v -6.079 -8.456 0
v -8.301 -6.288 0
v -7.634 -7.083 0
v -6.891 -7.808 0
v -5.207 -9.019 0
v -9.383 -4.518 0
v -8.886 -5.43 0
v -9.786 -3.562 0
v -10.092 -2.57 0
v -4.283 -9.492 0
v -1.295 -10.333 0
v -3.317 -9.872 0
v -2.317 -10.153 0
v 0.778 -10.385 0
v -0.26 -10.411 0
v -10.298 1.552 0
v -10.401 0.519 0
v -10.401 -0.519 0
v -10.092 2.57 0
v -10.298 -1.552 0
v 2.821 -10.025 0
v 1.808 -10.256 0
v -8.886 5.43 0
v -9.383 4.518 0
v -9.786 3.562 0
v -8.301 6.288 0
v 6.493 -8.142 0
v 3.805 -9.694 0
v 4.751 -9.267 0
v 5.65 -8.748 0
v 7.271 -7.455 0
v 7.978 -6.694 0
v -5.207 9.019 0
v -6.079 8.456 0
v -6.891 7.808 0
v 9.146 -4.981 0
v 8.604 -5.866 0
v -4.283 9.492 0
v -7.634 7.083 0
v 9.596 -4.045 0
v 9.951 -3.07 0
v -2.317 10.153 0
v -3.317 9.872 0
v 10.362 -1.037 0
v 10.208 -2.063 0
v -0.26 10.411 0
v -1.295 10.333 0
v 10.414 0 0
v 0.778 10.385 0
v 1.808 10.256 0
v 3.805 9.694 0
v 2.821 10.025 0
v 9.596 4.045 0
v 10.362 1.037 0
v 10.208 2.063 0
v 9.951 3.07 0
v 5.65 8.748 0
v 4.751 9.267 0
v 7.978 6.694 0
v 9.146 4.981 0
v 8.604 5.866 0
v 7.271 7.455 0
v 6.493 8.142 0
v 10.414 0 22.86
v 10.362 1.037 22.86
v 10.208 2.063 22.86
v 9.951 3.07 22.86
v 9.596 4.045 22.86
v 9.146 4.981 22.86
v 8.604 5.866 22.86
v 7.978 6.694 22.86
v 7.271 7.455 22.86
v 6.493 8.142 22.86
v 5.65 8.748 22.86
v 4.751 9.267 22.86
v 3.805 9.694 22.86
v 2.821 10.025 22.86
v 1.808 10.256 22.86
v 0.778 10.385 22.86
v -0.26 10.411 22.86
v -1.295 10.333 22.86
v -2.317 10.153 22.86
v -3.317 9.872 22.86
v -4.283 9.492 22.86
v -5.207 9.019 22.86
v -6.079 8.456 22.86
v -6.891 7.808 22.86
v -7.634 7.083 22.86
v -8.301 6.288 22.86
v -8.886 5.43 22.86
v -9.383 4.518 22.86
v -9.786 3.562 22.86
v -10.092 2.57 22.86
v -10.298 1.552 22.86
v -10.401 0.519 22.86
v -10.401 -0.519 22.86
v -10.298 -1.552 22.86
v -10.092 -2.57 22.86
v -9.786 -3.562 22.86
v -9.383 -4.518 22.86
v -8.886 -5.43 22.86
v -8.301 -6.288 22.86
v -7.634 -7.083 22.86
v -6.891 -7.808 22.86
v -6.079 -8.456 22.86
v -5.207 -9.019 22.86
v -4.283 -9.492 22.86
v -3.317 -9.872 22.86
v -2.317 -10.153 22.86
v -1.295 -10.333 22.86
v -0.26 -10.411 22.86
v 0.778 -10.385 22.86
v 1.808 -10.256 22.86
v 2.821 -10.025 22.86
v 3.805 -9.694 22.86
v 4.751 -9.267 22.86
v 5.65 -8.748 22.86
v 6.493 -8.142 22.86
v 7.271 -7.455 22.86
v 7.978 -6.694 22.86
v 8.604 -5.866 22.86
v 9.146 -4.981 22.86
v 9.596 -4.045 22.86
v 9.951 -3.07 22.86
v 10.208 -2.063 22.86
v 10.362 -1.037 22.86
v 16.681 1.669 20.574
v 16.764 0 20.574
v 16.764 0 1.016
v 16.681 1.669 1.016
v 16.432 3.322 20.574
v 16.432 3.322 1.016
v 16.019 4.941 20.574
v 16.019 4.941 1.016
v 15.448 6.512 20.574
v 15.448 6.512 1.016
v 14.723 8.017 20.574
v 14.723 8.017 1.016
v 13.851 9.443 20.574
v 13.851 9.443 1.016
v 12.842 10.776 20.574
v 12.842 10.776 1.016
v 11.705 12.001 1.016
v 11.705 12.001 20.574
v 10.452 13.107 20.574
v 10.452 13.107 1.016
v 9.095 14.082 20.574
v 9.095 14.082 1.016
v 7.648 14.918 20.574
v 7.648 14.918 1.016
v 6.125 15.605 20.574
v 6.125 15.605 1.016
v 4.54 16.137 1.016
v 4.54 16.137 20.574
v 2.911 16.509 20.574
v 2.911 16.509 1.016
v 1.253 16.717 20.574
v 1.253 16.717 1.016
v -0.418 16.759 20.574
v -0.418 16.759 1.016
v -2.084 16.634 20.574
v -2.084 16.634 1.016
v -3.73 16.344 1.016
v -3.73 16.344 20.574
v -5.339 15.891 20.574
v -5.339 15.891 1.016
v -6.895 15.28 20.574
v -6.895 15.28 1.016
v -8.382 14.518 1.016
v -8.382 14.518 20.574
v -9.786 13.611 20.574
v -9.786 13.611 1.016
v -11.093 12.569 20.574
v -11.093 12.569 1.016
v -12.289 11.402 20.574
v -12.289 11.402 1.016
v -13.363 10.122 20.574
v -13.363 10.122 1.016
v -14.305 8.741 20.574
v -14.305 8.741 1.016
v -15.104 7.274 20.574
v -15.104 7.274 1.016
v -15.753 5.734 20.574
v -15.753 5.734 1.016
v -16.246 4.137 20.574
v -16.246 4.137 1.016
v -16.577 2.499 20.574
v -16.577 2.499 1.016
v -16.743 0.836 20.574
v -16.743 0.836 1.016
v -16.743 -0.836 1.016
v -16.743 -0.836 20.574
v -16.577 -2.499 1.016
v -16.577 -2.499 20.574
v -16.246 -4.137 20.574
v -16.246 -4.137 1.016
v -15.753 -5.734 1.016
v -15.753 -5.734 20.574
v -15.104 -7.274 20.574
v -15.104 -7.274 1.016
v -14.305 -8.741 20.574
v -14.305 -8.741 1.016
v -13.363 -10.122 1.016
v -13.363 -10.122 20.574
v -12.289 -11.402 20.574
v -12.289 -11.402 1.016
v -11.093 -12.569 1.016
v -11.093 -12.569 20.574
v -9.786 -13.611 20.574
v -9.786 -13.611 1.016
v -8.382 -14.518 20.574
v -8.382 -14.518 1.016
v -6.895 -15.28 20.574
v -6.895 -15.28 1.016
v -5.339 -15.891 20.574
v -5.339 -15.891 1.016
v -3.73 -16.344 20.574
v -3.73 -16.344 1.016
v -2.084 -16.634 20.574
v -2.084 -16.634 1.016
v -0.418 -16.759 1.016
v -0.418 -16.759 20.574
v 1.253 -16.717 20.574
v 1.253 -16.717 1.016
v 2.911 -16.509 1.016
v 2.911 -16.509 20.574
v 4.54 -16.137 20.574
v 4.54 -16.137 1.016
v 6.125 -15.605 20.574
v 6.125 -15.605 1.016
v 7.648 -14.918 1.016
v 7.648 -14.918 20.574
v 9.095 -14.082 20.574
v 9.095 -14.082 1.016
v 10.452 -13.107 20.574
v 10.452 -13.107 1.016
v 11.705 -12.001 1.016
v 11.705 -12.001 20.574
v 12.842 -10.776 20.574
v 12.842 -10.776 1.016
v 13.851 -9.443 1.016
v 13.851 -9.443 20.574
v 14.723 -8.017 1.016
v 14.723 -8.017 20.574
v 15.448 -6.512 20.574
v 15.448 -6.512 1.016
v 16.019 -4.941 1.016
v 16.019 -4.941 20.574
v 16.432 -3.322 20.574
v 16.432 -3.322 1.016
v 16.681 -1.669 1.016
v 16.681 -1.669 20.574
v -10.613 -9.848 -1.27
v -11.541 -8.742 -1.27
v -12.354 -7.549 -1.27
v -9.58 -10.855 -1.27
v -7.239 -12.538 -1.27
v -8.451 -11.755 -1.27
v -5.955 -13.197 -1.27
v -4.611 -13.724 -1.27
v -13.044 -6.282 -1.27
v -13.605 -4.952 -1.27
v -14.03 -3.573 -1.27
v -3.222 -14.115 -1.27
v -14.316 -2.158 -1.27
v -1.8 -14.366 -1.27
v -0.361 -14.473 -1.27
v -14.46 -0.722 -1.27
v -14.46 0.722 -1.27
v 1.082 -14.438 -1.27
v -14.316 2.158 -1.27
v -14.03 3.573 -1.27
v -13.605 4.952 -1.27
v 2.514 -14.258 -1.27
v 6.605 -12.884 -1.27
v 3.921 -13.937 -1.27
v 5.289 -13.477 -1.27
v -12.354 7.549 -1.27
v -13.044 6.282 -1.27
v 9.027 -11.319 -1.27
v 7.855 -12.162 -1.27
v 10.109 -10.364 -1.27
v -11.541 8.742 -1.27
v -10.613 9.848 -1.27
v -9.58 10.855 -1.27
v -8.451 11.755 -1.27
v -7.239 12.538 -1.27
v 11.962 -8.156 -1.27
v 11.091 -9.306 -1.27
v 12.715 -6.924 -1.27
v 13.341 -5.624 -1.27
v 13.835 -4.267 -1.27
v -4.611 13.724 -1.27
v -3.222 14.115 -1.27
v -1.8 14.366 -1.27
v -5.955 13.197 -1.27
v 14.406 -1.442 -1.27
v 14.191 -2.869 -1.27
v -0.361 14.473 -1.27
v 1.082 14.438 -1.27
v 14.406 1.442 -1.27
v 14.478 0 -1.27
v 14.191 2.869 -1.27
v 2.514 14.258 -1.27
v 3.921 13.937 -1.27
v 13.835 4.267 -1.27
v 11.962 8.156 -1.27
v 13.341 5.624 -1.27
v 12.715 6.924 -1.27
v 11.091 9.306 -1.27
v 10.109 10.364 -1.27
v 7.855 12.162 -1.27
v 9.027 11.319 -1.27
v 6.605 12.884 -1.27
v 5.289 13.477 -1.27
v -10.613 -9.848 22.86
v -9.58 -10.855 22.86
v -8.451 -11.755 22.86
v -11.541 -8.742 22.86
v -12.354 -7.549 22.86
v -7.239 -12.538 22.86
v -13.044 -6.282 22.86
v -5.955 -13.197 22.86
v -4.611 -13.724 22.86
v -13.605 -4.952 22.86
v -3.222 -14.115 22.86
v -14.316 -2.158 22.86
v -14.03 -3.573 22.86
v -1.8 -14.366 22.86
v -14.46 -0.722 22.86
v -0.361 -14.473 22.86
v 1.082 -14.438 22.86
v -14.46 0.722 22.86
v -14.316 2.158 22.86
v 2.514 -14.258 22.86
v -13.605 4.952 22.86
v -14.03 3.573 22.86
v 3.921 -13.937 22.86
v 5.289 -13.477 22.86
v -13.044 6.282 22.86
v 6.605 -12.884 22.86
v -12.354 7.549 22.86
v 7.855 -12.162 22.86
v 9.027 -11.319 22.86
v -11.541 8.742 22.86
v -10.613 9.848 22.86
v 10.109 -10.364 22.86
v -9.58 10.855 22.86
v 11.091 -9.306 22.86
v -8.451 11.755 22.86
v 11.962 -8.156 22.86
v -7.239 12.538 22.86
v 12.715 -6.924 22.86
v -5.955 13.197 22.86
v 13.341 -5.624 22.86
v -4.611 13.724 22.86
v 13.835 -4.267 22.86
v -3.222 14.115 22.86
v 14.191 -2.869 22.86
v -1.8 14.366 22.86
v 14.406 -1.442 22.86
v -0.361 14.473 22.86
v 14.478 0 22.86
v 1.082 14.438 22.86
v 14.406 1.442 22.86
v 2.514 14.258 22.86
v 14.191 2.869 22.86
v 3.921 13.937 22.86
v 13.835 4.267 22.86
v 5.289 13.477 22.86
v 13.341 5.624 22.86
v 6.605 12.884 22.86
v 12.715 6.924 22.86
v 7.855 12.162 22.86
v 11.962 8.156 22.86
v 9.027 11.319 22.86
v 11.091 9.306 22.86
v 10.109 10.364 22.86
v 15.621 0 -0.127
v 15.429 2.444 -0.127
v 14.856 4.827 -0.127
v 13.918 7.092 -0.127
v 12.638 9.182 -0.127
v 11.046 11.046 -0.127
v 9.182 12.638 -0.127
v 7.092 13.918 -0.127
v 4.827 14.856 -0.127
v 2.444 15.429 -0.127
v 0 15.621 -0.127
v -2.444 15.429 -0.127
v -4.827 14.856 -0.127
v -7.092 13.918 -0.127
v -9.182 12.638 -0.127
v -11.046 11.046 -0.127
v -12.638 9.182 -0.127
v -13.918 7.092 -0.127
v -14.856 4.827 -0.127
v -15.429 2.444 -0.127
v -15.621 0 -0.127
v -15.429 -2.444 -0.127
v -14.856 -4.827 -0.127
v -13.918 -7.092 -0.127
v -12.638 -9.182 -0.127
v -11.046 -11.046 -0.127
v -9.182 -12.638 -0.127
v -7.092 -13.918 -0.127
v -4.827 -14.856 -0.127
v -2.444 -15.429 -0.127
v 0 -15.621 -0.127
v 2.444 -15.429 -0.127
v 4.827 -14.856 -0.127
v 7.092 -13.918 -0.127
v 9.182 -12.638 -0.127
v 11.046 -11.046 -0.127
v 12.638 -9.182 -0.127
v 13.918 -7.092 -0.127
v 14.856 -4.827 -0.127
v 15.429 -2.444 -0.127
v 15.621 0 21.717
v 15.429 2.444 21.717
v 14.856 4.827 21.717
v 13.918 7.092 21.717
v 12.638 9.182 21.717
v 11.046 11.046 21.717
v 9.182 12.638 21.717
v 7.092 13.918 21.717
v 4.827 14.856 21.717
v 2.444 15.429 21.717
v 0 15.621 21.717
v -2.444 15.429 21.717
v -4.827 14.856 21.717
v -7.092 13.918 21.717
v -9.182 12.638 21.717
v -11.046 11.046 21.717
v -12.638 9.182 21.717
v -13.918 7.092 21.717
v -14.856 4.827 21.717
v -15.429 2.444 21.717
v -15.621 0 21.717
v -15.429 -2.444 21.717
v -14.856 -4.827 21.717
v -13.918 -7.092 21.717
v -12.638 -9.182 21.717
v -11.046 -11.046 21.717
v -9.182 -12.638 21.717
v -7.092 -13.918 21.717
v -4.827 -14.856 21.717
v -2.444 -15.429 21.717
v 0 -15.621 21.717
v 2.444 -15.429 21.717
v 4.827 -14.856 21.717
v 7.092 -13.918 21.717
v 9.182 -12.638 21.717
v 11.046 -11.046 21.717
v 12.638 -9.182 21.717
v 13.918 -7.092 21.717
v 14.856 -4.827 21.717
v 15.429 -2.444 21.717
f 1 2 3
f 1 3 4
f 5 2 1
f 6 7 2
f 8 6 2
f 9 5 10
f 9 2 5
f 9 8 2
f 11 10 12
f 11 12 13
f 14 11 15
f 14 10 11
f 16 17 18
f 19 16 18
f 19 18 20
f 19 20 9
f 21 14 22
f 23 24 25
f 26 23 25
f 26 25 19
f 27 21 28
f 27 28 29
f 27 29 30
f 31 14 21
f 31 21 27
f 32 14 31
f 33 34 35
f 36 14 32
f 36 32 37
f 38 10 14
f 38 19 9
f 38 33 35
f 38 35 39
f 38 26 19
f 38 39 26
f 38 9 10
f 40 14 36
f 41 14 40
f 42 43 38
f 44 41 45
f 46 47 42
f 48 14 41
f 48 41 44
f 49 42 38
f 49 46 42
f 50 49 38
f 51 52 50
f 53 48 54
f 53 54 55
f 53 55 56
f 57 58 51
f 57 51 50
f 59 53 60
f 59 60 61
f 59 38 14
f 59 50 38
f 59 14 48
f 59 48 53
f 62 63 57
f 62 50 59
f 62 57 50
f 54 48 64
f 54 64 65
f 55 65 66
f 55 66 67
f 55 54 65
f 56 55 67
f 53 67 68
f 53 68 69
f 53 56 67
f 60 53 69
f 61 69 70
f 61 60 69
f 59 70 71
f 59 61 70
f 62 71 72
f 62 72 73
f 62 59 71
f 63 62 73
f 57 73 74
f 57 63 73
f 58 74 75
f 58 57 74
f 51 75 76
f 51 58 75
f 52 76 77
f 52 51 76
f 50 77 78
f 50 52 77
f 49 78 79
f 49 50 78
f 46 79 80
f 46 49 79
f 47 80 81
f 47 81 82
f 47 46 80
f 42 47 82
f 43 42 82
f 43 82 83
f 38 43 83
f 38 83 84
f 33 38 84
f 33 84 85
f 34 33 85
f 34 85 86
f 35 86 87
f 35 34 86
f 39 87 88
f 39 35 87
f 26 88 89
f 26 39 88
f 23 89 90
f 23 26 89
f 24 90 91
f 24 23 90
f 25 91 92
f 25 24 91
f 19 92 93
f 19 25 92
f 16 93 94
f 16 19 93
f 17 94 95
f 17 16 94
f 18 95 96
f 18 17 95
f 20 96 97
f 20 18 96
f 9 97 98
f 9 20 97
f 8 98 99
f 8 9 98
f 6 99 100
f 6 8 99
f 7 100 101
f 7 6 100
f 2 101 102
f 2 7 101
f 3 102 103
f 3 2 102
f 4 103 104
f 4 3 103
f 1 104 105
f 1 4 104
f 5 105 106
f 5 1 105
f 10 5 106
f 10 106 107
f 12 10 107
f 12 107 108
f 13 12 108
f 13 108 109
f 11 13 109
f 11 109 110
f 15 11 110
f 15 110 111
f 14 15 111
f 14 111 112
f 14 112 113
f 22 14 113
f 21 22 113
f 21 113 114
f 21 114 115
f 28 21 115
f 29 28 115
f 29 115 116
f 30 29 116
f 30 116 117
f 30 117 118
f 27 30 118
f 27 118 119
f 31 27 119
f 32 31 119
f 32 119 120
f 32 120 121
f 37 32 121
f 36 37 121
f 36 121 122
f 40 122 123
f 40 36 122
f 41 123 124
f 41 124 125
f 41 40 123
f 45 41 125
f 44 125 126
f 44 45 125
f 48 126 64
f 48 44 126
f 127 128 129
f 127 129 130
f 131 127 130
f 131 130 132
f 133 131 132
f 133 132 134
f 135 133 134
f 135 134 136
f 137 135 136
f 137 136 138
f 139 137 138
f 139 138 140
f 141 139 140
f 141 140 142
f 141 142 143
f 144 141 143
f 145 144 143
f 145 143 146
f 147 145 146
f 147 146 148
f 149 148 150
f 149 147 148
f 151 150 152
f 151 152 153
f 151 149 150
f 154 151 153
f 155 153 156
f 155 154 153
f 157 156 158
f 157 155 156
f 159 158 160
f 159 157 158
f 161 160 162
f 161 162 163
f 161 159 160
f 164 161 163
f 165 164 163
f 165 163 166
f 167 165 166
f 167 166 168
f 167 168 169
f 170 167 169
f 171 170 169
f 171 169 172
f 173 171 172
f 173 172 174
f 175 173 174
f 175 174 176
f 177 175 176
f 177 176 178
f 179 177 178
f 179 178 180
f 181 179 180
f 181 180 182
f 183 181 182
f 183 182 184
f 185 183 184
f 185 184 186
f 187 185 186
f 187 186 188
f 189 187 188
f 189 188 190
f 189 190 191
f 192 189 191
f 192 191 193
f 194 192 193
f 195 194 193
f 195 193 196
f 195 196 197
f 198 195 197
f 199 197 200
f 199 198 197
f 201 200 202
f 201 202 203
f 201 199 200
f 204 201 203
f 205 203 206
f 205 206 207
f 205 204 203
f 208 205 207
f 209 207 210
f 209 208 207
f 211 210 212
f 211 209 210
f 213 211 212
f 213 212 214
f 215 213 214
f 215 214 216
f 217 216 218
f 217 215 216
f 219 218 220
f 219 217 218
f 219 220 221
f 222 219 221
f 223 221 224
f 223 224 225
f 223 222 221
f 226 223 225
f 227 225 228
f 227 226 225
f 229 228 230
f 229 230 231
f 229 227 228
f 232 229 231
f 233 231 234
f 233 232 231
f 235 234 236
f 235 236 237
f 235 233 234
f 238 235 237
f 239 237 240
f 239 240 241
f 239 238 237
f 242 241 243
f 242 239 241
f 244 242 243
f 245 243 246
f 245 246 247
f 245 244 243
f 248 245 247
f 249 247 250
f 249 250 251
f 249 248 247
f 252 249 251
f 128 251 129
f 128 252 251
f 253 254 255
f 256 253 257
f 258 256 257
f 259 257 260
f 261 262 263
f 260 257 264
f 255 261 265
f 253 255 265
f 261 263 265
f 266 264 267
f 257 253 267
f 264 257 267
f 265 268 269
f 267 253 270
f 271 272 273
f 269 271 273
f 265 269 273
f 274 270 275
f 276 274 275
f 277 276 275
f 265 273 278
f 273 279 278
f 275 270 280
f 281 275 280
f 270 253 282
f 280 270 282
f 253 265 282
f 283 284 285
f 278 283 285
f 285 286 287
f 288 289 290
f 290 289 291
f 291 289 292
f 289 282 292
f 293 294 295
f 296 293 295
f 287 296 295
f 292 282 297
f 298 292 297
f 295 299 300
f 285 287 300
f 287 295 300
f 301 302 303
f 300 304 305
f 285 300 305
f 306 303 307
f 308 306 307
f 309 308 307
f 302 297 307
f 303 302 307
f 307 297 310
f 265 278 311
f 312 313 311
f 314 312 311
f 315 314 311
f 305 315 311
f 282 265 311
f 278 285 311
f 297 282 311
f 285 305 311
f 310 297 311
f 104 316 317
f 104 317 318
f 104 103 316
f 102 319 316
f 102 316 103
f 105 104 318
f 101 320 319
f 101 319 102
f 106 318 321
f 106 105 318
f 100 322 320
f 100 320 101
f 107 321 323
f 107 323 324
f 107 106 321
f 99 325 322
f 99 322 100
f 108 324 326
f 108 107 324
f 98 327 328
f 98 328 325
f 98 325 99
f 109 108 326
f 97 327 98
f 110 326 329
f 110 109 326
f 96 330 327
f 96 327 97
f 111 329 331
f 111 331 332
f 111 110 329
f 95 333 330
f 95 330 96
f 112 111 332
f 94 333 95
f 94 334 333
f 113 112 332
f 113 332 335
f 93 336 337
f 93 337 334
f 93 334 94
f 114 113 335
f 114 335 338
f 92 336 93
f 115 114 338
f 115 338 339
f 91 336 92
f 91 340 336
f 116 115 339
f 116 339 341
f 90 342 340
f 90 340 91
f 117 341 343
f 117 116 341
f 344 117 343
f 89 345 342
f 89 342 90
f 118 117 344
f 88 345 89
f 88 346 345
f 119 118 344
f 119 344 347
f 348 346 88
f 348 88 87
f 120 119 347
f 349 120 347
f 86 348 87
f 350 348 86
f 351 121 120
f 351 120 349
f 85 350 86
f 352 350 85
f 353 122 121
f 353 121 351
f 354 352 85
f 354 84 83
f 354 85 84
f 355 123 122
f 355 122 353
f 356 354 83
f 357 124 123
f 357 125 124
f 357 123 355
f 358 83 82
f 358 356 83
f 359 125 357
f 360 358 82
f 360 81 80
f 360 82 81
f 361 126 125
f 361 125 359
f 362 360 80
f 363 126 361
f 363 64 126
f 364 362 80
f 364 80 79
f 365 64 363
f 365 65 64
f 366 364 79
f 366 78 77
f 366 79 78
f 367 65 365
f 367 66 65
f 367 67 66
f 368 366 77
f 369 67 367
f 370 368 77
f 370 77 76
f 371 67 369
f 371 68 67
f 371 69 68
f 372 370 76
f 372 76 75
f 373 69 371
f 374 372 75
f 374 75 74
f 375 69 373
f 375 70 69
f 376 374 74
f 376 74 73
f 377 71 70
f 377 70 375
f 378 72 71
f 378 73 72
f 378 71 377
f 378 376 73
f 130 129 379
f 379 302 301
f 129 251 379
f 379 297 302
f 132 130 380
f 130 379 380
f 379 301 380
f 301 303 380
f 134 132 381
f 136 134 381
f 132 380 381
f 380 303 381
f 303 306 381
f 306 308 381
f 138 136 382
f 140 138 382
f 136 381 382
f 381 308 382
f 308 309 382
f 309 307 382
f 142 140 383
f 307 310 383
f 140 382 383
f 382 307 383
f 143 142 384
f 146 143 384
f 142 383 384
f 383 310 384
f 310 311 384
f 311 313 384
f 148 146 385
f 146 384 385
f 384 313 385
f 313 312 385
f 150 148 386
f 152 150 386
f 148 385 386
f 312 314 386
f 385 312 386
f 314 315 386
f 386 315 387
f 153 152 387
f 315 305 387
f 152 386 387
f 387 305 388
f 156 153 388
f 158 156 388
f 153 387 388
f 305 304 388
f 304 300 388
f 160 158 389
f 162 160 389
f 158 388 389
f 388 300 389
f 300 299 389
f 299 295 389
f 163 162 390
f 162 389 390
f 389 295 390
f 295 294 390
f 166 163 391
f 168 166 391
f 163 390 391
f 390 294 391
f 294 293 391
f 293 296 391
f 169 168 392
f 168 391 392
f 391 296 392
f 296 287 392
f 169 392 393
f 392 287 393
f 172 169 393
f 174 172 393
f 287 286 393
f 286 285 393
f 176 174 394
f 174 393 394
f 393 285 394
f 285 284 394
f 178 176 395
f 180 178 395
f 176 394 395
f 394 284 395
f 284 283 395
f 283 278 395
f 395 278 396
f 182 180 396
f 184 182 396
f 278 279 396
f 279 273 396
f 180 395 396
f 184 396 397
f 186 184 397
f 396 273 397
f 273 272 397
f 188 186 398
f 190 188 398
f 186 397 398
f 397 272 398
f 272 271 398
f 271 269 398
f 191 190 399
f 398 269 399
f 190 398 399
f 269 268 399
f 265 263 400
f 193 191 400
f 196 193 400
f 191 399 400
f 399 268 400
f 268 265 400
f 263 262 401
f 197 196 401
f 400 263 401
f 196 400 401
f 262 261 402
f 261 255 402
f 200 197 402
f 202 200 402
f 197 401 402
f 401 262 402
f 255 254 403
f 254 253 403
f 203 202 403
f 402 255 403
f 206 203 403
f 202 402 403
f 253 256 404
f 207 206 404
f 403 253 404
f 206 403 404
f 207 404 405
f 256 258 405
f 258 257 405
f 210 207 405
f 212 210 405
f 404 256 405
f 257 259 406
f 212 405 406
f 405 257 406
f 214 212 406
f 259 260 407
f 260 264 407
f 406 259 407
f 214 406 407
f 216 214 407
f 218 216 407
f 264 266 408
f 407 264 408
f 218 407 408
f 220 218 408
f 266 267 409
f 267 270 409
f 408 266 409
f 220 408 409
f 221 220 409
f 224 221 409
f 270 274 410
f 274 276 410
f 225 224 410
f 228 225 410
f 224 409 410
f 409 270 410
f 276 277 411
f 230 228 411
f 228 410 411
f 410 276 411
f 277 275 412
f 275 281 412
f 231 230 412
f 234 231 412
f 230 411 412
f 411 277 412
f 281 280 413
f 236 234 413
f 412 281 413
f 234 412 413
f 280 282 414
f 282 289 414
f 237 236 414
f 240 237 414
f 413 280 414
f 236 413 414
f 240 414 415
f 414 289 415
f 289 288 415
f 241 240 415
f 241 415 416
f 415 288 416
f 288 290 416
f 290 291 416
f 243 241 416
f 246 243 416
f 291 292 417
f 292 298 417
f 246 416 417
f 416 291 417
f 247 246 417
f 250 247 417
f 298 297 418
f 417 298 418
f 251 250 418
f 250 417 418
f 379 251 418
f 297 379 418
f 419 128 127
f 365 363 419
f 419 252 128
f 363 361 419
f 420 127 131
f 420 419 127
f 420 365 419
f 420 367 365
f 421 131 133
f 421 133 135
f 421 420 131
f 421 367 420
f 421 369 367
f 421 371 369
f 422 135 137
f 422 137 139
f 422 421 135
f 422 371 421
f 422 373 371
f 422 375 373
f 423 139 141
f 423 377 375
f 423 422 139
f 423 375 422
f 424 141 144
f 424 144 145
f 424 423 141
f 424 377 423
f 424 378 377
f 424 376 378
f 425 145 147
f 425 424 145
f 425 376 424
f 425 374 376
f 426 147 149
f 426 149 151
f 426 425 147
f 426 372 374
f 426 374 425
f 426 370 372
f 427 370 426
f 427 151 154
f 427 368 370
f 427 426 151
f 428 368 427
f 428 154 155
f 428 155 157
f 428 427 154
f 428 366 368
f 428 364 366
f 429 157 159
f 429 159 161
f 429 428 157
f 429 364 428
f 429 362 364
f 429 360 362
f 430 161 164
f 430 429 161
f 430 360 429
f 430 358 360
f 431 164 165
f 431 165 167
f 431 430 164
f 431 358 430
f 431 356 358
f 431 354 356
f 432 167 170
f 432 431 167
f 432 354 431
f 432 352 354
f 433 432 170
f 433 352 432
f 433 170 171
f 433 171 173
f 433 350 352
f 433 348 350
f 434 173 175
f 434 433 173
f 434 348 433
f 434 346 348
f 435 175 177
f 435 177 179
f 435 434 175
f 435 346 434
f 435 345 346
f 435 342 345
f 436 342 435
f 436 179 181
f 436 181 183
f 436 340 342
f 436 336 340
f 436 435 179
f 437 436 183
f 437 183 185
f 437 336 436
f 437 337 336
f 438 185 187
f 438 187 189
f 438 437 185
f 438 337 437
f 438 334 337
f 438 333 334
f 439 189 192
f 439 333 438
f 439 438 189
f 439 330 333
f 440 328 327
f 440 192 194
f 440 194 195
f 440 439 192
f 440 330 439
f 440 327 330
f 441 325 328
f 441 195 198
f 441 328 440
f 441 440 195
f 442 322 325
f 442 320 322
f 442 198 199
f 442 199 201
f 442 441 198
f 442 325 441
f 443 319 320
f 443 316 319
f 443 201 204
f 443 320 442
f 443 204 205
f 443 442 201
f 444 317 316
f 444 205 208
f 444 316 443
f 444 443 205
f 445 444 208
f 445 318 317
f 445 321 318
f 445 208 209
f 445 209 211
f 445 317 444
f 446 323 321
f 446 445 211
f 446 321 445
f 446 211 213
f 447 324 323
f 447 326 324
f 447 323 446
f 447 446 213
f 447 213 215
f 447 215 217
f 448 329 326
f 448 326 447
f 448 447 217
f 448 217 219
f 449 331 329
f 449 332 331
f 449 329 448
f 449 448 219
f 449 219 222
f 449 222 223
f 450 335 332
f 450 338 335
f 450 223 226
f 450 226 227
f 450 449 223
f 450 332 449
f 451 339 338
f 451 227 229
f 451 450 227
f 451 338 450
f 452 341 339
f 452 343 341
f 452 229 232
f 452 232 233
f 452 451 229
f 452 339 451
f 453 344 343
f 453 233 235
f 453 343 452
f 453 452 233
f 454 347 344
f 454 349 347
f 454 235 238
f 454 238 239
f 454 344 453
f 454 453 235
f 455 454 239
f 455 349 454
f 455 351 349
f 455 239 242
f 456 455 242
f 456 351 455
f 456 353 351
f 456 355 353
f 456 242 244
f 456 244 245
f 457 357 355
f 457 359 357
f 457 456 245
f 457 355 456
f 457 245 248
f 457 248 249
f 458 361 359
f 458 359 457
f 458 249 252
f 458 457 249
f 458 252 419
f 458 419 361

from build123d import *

# Parameters (mm, degrees)
F0_R     = 16.764
F0_R_2   = 10.414
F1_DEPTH = 22.86
F2_DEPTH = 1.27
F3_SIZE  = 2.286


with BuildPart() as f1:
    # F0 (on Top) → F1 (new body)
    with BuildSketch(Plane.XY):
        Circle(F0_R)
        Circle(F0_R_2, mode=Mode.SUBTRACT)
    extrude(amount=F1_DEPTH)

    # F0 (on Top) → F2 (join)
    with BuildSketch(Plane.XY):
        Circle(F0_R)
        Circle(F0_R_2, mode=Mode.SUBTRACT)
        Circle(F0_R_2)
    extrude(amount=-F2_DEPTH)

    # F3
    f3_edges = [f1.edges().sort_by_distance(p)[0] for p in [
        (-16.764, 0, -1.27),
        (-16.764, 0, 22.86),
    ]]
    chamfer(f3_edges, length=F3_SIZE)


solid = f1.part
